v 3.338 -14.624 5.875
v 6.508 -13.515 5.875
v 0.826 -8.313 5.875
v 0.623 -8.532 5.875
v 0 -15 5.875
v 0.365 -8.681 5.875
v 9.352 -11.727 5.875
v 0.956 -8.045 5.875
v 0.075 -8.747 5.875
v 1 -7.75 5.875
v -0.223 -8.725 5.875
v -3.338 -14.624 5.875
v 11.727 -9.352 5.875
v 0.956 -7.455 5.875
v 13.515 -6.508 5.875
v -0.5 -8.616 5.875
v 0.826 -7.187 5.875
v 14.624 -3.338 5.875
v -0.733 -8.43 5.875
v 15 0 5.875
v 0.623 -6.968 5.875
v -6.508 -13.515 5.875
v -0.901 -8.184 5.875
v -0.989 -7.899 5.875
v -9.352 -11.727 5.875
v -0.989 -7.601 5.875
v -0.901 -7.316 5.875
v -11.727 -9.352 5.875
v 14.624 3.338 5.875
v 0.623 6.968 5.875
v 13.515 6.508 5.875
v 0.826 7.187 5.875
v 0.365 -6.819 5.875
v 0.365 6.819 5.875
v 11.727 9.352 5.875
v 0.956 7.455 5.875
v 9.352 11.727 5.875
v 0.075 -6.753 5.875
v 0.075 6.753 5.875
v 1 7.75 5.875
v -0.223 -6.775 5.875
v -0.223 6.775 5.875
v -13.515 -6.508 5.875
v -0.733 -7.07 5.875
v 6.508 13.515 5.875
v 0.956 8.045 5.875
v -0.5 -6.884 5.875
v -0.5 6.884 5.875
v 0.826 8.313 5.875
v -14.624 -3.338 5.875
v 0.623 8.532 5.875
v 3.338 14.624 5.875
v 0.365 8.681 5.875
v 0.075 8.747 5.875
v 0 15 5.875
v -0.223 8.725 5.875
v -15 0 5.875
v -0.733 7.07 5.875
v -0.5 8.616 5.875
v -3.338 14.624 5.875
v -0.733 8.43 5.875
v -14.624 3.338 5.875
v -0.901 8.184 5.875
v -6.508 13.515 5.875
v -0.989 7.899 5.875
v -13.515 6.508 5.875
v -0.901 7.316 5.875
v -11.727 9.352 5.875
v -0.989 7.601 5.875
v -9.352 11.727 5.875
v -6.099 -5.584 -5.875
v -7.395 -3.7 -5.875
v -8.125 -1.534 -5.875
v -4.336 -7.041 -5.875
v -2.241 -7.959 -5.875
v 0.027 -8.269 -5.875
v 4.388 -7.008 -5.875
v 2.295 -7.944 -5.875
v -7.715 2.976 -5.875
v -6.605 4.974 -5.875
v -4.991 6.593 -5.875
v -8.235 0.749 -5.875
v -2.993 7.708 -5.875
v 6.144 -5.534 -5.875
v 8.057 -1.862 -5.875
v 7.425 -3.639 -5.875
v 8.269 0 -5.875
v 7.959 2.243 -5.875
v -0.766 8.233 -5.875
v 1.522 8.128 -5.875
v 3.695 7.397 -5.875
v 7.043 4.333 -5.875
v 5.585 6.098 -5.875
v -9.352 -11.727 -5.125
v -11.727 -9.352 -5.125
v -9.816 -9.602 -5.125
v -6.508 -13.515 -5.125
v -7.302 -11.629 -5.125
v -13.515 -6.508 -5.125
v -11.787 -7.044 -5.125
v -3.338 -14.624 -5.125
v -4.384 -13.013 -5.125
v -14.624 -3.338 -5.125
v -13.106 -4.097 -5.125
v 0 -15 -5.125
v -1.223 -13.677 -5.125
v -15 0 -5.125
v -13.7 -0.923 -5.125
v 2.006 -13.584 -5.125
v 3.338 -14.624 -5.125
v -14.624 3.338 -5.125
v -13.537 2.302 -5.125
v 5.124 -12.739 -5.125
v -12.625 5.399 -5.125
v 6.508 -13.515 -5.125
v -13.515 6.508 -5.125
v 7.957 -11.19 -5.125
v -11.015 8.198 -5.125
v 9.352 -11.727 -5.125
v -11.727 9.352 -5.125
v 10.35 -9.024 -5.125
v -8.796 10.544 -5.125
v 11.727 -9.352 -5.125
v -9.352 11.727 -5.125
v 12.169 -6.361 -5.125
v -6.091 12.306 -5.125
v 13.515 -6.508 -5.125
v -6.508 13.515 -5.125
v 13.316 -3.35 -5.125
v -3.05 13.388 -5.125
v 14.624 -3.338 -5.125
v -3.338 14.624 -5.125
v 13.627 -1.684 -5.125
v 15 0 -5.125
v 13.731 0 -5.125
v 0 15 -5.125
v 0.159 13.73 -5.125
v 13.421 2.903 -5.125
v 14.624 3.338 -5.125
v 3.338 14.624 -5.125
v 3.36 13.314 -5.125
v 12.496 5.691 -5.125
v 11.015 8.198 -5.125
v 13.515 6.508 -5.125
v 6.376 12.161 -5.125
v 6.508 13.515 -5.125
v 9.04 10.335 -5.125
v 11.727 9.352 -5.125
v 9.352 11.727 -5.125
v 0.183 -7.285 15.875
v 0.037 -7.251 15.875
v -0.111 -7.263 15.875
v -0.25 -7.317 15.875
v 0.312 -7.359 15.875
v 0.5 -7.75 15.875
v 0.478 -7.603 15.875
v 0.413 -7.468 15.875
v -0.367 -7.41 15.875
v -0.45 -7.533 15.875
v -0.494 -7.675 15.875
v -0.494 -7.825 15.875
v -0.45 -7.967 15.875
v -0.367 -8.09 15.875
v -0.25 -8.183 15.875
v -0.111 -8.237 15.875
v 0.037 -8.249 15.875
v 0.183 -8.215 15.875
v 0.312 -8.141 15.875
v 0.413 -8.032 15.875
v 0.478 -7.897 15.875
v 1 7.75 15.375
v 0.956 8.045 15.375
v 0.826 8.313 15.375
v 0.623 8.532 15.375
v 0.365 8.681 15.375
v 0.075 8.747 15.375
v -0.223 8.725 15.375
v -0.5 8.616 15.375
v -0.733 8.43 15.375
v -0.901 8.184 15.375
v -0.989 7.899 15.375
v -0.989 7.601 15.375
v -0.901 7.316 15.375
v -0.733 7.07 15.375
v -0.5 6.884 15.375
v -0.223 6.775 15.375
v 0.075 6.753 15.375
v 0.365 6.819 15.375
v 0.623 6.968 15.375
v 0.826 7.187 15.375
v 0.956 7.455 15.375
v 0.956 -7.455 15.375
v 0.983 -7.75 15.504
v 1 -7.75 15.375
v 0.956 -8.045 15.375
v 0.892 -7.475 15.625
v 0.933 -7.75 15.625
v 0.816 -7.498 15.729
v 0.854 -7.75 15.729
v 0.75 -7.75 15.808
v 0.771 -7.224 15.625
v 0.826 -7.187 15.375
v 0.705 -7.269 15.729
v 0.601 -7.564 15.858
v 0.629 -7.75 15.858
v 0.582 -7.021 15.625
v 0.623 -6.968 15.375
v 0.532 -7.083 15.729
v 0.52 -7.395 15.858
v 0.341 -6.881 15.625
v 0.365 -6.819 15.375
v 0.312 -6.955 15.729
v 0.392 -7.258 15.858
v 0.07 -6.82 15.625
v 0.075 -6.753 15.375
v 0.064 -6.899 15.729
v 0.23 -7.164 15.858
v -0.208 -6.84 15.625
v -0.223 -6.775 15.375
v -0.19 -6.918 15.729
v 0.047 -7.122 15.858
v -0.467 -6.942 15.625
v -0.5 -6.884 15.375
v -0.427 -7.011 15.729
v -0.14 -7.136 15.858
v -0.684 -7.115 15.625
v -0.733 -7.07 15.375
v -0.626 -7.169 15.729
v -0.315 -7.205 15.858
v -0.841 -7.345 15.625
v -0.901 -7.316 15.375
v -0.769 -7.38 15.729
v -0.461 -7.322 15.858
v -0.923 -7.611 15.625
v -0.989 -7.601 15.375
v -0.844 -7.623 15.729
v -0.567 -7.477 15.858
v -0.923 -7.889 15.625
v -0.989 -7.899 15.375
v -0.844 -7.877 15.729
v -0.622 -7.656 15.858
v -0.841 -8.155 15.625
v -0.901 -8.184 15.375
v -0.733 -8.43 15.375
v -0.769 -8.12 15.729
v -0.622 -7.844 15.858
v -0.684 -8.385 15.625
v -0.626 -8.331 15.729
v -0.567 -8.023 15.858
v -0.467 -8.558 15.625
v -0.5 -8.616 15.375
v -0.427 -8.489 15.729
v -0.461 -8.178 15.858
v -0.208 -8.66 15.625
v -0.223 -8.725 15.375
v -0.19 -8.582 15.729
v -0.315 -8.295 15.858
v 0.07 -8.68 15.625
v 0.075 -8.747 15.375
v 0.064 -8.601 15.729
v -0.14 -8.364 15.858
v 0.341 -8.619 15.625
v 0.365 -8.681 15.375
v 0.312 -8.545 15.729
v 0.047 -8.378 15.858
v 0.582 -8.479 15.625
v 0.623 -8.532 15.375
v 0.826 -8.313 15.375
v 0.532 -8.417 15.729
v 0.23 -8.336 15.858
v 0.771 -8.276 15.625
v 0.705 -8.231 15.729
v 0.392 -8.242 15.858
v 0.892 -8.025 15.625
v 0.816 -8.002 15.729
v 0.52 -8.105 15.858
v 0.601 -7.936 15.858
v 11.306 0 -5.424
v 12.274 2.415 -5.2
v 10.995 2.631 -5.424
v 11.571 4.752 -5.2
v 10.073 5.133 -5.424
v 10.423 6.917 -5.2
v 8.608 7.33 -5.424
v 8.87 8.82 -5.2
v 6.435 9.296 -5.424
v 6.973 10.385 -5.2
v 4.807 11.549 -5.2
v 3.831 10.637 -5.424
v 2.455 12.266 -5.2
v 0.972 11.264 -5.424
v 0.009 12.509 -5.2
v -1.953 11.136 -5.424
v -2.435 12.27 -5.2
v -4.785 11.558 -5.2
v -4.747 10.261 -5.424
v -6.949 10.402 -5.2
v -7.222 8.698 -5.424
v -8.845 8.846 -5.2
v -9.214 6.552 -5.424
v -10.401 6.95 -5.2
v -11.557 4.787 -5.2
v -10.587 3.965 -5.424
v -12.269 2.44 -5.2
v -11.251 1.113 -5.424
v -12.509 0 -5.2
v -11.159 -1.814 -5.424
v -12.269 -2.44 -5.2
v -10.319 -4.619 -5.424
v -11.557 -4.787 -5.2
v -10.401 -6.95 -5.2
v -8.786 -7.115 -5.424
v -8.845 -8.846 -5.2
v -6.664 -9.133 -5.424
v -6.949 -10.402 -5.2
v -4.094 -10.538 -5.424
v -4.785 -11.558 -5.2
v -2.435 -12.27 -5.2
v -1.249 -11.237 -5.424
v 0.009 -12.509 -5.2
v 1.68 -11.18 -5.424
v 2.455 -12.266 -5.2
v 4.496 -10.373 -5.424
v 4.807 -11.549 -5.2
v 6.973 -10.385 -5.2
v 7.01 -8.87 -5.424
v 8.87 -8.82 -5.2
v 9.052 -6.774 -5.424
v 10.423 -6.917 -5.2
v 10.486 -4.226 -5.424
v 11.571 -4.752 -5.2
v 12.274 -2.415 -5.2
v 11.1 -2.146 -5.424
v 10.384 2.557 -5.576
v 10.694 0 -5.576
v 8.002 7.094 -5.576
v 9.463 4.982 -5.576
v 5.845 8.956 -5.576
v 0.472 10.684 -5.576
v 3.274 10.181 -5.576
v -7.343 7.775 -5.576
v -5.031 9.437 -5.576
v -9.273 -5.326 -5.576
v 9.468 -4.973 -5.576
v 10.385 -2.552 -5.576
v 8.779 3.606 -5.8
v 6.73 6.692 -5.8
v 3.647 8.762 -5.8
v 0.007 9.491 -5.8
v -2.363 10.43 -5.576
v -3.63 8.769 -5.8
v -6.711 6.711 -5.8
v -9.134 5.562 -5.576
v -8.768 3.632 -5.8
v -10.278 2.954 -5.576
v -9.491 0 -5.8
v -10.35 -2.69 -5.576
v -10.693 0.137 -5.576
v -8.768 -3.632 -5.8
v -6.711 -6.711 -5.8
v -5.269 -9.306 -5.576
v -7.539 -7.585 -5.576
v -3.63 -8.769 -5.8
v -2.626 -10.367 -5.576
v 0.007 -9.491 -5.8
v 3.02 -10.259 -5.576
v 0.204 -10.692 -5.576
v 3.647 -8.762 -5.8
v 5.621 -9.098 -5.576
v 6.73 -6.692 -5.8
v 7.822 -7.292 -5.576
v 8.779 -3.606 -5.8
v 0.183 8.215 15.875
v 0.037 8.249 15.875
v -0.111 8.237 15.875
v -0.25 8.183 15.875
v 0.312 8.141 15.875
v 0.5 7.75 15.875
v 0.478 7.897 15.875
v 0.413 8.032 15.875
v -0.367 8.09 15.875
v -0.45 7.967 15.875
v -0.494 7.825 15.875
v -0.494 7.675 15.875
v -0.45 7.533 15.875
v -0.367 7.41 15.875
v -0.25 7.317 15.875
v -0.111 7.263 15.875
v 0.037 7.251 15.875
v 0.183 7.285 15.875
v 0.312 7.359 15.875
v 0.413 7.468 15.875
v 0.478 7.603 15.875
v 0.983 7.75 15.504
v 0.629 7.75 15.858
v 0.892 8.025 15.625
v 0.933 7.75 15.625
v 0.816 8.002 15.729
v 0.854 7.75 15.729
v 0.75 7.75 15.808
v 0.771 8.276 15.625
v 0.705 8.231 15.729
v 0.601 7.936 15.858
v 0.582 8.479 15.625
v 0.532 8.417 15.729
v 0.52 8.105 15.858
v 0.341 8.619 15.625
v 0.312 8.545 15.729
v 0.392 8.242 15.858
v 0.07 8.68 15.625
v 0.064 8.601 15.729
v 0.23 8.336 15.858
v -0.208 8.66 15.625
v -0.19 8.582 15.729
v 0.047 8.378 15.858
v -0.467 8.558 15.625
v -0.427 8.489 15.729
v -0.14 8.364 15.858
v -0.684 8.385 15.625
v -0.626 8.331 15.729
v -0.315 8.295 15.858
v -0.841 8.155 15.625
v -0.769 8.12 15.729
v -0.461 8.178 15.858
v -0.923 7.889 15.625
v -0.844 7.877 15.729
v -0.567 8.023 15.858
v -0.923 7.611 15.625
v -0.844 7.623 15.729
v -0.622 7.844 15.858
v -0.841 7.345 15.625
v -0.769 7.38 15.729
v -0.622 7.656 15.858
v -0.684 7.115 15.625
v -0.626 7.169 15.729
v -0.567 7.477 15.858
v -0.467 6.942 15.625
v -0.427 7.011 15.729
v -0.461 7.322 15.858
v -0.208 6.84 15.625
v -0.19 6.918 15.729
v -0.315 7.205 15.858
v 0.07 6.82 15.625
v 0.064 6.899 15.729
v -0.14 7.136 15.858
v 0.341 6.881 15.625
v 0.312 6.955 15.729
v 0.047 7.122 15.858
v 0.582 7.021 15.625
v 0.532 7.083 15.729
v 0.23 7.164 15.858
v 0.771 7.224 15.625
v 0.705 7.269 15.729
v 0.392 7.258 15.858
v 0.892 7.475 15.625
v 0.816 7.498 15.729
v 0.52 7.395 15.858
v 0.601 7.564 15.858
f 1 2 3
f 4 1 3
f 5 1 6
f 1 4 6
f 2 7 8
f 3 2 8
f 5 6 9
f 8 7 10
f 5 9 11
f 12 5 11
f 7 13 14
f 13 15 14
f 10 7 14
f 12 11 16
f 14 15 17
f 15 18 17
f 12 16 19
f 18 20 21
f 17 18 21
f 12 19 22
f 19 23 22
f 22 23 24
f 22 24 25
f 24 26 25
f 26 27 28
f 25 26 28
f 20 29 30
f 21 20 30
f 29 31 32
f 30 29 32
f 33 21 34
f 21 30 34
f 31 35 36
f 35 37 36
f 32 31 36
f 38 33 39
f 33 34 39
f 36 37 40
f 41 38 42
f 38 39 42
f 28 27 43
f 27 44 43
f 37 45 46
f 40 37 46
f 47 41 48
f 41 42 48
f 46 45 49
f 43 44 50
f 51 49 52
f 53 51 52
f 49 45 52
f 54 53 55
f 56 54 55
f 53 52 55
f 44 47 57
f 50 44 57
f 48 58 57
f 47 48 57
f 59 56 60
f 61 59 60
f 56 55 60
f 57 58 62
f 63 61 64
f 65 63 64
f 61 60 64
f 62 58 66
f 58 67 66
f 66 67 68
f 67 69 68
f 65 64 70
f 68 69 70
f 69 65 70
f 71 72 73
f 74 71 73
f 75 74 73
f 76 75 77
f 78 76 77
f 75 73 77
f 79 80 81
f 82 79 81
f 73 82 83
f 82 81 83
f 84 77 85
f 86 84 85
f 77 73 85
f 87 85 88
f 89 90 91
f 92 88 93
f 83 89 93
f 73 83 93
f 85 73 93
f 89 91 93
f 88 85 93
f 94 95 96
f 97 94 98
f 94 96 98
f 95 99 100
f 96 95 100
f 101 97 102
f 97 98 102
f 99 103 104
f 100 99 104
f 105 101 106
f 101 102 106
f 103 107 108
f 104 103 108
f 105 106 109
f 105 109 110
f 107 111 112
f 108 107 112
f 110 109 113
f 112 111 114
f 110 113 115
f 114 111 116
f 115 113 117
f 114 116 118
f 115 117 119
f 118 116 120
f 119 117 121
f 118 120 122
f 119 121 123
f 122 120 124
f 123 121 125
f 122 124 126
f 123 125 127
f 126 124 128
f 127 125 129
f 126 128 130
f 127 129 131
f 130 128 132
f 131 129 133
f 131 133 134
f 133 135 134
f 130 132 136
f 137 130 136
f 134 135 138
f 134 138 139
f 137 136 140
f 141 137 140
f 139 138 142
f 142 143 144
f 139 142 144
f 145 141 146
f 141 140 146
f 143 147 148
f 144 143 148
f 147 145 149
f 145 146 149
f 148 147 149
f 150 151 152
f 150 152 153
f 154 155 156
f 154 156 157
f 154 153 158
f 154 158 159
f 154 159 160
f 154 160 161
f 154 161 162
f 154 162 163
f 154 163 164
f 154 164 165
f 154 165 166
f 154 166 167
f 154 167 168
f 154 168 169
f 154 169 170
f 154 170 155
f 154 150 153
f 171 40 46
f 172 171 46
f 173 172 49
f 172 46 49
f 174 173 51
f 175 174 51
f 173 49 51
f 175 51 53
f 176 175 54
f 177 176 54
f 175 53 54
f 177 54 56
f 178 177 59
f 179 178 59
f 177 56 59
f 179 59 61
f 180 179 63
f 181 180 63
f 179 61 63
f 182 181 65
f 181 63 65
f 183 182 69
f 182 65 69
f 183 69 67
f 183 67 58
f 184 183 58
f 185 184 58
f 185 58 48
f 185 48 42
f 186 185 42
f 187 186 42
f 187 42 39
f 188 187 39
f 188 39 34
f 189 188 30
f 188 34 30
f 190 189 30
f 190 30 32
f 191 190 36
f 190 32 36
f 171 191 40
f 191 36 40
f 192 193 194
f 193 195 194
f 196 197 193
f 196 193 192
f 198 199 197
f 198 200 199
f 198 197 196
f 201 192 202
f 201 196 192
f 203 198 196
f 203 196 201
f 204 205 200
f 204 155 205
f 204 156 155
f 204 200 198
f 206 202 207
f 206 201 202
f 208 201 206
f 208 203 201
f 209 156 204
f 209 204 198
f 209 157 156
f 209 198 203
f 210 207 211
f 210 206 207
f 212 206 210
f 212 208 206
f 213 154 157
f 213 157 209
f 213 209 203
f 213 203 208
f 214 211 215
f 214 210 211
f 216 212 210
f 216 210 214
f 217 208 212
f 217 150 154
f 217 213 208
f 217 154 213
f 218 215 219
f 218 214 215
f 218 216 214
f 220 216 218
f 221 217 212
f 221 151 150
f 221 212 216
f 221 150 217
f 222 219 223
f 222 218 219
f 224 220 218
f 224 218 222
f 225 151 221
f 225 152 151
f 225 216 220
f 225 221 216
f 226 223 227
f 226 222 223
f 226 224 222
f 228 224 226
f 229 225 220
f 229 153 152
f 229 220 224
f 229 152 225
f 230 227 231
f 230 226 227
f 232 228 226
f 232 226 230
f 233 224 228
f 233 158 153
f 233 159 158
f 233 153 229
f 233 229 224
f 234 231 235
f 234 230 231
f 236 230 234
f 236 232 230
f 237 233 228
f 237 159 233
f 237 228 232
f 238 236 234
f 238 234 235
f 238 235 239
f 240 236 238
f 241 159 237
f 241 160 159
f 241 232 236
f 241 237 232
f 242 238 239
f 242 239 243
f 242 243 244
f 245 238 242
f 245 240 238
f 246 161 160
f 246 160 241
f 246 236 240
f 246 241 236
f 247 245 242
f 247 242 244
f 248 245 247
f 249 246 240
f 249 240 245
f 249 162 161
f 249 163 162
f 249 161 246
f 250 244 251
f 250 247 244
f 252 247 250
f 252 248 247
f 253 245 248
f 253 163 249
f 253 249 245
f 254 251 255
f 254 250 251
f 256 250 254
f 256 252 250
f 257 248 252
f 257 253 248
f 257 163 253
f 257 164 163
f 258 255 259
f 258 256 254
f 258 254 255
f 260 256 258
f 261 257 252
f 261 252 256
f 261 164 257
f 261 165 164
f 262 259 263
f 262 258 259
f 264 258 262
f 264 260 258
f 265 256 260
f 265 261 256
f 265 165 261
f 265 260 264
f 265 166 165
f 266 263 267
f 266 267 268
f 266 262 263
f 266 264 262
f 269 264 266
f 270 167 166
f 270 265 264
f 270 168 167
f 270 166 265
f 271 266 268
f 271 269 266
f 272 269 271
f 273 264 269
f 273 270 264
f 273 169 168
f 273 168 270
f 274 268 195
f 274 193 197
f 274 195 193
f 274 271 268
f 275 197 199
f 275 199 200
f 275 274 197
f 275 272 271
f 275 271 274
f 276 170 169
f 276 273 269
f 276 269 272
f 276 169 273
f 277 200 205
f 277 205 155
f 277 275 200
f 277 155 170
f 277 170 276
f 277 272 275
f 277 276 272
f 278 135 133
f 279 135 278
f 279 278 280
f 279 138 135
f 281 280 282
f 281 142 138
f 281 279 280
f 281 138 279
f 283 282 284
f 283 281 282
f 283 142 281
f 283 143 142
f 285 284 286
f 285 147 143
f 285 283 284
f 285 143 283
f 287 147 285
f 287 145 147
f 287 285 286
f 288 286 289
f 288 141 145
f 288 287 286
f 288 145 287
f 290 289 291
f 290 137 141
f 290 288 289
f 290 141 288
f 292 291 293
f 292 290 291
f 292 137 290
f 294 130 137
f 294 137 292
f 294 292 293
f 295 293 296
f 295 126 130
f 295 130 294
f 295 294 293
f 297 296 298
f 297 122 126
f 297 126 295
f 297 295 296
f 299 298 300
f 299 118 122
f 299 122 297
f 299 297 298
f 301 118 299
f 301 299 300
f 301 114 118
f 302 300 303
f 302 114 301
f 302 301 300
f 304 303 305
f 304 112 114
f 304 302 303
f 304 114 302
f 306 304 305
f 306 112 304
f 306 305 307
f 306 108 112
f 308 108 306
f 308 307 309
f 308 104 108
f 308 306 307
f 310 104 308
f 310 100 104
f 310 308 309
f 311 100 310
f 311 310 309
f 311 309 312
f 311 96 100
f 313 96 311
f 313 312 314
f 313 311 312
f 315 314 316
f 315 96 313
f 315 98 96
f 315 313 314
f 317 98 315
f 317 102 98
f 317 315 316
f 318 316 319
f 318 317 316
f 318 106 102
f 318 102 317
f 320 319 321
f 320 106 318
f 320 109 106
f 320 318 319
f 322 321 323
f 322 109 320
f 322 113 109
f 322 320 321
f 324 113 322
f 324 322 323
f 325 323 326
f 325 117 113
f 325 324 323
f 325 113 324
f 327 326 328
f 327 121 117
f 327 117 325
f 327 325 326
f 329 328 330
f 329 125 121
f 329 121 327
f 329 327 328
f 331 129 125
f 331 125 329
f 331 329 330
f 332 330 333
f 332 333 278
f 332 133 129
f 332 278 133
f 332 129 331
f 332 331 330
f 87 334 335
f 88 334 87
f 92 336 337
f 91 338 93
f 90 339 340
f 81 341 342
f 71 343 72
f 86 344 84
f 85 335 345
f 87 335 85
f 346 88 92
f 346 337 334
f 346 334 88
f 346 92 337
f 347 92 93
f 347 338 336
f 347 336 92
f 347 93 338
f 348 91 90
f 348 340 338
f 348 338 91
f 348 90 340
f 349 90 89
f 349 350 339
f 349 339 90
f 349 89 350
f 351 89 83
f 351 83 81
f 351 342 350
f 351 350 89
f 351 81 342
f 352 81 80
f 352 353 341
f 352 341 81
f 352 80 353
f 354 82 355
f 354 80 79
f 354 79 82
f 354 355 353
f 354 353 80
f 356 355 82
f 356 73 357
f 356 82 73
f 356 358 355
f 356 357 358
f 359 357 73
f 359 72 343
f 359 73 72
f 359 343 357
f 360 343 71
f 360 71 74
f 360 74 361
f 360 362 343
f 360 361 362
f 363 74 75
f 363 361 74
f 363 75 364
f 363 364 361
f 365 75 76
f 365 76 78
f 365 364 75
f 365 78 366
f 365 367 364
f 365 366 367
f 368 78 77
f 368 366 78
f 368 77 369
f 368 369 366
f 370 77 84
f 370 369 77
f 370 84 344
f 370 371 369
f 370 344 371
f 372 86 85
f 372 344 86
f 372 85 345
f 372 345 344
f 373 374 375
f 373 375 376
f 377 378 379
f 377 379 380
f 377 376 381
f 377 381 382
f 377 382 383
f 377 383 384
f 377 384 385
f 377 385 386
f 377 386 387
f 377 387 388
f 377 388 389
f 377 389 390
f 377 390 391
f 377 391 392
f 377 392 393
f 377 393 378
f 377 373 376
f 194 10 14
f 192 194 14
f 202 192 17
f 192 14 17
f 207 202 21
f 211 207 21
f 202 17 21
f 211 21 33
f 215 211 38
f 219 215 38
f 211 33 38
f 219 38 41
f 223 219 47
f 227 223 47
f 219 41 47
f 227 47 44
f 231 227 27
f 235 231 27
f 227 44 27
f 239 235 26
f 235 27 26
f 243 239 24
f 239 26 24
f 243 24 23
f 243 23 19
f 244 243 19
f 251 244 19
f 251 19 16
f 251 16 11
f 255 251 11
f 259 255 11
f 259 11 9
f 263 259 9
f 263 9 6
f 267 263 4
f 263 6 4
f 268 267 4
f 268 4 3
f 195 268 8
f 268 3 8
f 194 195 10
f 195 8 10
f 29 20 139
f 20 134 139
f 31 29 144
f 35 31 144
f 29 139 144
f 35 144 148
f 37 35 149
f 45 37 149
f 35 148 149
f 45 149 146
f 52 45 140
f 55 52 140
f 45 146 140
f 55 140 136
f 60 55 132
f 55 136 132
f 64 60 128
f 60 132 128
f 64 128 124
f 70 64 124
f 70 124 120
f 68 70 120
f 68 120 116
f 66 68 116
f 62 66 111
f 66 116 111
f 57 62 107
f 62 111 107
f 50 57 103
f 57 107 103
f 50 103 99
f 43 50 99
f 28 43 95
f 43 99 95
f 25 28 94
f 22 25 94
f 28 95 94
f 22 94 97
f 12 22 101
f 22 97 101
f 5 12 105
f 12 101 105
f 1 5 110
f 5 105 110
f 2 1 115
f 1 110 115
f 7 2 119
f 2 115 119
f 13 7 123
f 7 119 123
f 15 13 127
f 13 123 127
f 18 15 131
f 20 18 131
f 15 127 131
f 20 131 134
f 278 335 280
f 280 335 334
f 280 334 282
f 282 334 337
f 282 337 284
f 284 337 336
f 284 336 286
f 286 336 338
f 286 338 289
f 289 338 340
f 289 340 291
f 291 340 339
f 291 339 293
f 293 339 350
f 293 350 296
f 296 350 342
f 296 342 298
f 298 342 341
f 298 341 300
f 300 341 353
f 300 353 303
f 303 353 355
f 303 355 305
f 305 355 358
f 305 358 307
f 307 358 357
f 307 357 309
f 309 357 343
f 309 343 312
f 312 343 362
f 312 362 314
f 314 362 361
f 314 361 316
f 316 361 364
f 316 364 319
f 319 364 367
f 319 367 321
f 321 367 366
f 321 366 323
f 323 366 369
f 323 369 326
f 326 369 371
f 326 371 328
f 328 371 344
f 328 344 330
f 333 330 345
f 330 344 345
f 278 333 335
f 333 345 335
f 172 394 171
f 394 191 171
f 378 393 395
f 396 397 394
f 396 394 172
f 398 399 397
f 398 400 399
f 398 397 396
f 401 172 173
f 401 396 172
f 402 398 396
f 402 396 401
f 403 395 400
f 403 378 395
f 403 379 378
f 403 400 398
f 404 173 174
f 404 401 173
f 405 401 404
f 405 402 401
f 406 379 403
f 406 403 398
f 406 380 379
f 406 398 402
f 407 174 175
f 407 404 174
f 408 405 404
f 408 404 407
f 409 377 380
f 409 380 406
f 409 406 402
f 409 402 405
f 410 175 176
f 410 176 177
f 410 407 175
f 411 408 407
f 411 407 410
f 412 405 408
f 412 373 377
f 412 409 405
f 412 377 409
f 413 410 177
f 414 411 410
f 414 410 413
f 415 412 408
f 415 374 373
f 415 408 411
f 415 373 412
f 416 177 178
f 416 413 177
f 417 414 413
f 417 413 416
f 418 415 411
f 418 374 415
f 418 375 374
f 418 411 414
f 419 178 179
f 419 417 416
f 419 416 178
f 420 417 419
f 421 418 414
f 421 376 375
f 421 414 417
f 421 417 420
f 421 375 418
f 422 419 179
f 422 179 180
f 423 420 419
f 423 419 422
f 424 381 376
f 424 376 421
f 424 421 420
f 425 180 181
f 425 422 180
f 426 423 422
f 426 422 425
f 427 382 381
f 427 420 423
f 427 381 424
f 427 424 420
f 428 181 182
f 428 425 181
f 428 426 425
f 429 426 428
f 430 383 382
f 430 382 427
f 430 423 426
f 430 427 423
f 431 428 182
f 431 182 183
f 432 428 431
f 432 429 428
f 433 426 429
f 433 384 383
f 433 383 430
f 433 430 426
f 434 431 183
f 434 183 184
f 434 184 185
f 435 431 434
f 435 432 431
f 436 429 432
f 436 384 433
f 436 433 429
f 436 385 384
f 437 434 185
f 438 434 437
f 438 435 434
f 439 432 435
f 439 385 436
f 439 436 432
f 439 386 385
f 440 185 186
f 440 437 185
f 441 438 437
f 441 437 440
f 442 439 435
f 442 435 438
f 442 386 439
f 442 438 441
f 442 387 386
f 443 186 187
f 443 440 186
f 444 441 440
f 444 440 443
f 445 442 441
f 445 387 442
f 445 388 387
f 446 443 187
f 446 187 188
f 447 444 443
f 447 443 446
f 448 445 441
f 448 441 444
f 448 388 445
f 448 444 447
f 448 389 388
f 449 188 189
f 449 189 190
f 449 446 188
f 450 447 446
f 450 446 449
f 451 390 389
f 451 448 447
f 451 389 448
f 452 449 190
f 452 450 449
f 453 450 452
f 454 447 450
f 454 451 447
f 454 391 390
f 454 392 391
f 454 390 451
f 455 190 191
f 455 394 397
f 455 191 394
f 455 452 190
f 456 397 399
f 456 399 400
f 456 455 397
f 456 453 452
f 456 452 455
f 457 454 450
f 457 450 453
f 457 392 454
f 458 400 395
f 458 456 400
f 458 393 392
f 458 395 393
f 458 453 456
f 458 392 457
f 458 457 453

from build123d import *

# Parameters (mm, degrees)
FILLET1_R           = 10
SKETCH3_R           = 1
BOSS_EXTRUDE1_DEPTH = 10
FILLET2_R           = 0.5


with BuildPart() as part:
    # Sketch2 → Revolve1 (revolve)
    with BuildSketch(Plane(origin=(0, 0, 0), x_dir=(1, 0, 0), z_dir=(0, 1, 0))):
        with BuildLine():
            Line((0, -5.875), (15, -5.875))
            Line((15, -5.875), (15, 5.125))
            Line((15, 5.125), (12.5, 5.125))
            add(Edge.make_bspline(
                [(12.5, 5.125), (9.5, 5.875)],
                knots=[0, 0, 1, 1], degree=1))
            Line((9.5, 5.875), (0, 5.875))
            Line((0, 5.875), (0, -5.875))
        make_face()
    revolve(axis=Axis((0, 0, 0), (0, 0, 1)))

    # Fillet1
    fillet1_edges = [part.edges().sort_by_distance(p)[0] for p in [
        (-12.5, 0, -5.125),
        (-9.5, 0, -5.875),
    ]]
    fillet(fillet1_edges, radius=FILLET1_R)

    # Sketch3 → Boss-Extrude1 (add)
    with BuildSketch(Plane.XY.offset(5.875)):
        with Locations((0, 7.75)):
            Circle(SKETCH3_R)
        with Locations((0, -7.75)):
            Circle(SKETCH3_R)
    extrude(amount=BOSS_EXTRUDE1_DEPTH)

    # Fillet2
    fillet2_edges = [part.edges().sort_by_distance(p)[0] for p in [
        (-1, 7.75, 15.875),
        (-1, -7.75, 15.875),
    ]]
    fillet(fillet2_edges, radius=FILLET2_R)


solid = part.part
